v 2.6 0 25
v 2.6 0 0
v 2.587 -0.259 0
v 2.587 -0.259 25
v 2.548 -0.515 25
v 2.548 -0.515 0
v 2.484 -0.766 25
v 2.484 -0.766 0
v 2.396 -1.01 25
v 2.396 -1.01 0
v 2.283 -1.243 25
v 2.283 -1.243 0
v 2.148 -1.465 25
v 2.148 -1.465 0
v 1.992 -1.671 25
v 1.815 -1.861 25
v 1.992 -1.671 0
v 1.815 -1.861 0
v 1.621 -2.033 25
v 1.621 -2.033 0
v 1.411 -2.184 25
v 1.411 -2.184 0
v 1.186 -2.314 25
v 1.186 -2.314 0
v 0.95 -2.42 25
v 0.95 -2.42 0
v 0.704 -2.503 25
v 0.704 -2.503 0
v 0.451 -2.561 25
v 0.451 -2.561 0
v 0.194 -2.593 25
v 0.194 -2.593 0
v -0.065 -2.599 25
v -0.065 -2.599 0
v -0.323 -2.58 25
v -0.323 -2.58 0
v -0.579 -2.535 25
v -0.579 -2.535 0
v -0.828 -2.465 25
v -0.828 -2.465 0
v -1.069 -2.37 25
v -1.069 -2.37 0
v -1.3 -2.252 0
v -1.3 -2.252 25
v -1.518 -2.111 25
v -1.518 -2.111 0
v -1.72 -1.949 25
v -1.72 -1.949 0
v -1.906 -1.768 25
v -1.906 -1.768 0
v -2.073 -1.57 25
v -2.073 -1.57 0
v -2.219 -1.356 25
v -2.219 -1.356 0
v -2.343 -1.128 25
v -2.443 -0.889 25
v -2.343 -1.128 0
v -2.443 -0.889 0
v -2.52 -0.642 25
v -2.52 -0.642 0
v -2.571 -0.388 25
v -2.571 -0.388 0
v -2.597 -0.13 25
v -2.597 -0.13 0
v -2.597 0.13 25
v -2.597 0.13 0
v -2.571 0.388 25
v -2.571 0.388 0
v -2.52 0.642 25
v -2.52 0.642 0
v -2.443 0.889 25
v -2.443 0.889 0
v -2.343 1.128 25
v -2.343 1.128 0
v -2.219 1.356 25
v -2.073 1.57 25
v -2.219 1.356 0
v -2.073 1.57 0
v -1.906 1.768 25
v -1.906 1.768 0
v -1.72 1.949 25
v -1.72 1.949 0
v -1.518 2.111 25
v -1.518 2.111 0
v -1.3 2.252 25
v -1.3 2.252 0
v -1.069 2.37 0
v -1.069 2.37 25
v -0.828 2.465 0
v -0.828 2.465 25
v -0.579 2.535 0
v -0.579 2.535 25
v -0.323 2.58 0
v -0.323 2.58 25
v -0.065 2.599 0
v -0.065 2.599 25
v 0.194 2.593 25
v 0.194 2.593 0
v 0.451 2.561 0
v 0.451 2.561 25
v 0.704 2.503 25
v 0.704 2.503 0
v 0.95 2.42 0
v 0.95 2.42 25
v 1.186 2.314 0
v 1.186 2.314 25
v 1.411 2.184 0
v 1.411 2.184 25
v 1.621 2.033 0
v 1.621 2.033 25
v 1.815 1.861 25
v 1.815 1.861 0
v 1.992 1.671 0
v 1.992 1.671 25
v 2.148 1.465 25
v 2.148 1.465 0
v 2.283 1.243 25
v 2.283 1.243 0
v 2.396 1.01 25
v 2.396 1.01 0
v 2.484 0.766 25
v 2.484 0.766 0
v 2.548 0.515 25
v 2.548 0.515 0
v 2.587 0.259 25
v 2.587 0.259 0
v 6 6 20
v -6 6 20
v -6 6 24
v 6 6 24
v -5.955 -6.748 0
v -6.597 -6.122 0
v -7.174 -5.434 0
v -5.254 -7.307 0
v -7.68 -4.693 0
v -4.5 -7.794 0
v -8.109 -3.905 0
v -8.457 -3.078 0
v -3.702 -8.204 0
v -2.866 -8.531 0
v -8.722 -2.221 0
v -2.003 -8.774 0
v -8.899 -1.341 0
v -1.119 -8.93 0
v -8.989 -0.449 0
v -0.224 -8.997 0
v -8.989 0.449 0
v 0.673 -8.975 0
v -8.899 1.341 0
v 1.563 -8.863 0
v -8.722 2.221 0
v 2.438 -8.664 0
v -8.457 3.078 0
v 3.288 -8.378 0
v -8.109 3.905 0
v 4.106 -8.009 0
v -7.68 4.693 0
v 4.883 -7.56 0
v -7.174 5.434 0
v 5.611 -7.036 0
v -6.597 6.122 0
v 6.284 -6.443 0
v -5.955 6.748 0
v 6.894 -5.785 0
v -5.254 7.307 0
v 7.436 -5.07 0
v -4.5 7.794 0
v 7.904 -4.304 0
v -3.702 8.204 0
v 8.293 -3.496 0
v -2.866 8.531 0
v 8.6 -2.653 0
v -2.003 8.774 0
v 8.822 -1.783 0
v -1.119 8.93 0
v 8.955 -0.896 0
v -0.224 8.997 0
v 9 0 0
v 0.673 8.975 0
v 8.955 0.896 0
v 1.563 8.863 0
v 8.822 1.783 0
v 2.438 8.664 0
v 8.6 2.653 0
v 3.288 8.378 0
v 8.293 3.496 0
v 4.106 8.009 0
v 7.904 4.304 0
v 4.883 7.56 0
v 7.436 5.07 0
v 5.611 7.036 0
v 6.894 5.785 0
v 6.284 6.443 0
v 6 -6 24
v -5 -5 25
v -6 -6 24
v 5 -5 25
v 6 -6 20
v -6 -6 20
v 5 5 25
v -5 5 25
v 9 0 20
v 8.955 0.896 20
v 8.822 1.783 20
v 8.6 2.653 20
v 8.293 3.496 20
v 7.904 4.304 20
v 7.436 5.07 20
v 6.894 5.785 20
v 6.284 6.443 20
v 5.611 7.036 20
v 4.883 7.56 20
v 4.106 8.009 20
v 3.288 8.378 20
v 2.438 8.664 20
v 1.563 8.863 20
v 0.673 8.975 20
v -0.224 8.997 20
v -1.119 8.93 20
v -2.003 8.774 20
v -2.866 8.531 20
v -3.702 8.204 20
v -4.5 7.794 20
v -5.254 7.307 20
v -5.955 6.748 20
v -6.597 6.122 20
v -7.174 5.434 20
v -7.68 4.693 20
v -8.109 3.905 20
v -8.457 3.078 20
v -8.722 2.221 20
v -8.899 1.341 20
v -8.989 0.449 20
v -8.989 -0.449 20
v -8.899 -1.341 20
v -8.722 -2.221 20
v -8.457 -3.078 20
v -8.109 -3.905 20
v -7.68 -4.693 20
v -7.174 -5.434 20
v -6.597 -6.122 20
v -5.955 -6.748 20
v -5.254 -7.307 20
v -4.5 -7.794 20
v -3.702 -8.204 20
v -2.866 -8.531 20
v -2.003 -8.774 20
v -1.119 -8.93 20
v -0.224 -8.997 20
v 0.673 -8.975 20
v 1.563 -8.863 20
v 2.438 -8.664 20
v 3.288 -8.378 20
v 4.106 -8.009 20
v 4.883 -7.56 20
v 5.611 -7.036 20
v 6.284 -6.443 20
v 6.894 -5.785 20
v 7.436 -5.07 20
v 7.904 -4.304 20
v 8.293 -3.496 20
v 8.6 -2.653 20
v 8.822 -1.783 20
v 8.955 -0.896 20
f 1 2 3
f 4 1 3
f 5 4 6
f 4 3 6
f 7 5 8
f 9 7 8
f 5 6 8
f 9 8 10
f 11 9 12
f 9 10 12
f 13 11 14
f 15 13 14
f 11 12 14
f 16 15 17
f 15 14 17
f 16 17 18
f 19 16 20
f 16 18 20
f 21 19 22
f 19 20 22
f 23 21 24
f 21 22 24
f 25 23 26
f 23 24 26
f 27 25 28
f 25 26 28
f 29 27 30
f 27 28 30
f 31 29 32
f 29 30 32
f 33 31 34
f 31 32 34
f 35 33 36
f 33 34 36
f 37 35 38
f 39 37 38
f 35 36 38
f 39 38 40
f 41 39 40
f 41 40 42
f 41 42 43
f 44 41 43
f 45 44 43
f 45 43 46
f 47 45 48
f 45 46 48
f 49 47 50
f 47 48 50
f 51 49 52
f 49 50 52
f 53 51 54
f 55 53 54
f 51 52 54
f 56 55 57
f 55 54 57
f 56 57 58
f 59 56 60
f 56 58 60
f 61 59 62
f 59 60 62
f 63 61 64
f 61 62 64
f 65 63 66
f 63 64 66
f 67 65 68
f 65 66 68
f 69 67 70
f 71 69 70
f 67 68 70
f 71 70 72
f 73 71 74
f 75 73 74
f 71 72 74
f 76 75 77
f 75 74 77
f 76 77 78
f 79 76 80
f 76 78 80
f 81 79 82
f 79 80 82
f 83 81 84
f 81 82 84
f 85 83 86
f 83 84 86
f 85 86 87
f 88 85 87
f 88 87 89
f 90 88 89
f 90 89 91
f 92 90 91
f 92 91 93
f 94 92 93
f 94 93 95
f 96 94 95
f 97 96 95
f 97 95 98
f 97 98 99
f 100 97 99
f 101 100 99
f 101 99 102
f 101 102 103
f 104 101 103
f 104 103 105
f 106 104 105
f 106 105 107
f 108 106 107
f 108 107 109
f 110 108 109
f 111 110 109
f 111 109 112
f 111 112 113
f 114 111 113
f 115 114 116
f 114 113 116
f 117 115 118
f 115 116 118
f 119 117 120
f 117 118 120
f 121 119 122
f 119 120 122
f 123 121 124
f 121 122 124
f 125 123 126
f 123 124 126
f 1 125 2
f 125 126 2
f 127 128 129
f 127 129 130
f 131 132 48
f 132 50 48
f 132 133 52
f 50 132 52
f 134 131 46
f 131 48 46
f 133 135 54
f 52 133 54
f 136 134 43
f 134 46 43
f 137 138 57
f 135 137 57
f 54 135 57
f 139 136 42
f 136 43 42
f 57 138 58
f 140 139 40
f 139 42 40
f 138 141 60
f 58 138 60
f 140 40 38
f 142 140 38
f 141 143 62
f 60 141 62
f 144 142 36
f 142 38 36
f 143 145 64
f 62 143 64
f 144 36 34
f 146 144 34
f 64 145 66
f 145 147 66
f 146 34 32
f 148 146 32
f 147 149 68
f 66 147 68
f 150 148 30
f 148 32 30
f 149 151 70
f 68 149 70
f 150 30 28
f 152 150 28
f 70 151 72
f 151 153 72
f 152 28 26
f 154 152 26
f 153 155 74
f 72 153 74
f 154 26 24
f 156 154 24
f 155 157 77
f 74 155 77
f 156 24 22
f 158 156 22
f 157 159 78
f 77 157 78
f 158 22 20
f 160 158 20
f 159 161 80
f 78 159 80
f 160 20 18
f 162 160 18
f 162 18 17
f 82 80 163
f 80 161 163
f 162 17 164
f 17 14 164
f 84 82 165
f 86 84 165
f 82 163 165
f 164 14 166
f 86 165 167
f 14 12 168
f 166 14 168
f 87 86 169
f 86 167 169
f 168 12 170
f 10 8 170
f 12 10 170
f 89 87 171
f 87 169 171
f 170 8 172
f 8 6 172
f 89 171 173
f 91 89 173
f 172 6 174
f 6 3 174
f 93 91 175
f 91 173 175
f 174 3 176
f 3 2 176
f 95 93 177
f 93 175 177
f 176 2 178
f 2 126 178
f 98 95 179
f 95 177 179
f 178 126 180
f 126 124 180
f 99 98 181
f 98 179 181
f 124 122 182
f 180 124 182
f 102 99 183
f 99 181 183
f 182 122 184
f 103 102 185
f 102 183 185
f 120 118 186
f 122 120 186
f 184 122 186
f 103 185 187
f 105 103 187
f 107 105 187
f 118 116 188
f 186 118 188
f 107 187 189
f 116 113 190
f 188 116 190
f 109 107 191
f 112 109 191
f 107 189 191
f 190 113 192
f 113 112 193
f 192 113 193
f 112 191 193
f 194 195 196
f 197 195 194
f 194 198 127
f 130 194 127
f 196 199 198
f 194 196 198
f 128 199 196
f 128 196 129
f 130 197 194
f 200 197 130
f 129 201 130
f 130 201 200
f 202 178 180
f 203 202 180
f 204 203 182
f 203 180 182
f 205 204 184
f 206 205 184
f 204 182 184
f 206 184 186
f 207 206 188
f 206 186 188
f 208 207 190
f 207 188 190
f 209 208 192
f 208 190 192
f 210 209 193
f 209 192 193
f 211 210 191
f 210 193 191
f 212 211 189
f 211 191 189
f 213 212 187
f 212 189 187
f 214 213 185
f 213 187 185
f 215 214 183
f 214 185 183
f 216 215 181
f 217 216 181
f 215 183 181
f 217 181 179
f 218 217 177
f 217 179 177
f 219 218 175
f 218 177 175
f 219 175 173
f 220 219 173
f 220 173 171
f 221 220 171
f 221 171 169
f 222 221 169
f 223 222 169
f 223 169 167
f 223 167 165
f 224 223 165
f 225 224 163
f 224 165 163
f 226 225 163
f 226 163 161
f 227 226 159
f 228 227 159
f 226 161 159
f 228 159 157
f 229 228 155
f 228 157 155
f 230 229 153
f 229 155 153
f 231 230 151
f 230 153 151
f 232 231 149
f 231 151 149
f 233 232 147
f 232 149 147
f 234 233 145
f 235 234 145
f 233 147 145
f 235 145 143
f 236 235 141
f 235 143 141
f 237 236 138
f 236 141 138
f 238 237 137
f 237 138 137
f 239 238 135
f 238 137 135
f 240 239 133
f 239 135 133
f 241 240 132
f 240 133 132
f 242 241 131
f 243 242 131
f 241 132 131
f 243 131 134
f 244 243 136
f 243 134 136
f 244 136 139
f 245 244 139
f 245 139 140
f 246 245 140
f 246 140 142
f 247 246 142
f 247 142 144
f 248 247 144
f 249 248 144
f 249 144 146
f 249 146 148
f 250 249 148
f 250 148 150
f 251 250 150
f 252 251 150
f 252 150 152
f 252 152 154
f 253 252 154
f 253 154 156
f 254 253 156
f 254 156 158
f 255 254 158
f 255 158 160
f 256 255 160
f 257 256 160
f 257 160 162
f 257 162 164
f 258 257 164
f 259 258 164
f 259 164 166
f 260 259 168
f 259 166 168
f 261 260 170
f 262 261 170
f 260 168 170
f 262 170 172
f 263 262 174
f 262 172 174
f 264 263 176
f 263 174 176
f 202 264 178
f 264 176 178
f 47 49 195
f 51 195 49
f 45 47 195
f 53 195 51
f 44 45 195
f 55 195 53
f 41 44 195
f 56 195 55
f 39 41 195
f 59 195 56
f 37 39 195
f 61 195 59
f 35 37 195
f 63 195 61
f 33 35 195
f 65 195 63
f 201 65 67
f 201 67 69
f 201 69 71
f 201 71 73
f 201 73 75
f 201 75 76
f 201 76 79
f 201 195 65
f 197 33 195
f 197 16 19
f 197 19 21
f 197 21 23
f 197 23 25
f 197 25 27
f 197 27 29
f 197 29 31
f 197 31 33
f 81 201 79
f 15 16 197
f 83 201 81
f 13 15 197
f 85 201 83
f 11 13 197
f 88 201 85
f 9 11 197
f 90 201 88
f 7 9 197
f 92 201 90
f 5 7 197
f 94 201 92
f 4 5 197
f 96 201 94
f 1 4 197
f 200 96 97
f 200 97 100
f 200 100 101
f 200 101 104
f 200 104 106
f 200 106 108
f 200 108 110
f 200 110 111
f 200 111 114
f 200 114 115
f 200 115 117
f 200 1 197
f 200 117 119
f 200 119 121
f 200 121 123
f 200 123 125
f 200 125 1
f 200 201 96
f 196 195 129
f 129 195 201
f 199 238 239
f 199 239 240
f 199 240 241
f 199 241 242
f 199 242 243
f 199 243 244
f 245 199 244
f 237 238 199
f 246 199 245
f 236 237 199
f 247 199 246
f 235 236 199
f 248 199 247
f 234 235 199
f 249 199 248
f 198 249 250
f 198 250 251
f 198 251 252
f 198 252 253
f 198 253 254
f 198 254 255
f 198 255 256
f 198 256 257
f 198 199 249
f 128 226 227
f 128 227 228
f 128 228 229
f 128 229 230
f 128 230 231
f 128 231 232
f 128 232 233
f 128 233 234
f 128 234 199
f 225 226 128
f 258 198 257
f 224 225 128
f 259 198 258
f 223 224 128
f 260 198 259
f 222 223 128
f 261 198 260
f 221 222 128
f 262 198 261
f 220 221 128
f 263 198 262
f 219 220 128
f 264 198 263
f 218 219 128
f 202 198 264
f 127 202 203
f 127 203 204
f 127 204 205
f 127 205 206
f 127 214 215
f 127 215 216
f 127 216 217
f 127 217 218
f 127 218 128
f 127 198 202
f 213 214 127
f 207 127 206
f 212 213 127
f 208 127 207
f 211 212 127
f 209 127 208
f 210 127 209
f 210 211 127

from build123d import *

# Parameters (mm, degrees)
SKETCH_R     = 9
PAD_DEPTH    = 20
SKETCH002_W  = 12
SKETCH002_H  = 12
PAD001_DEPTH = 5
SKETCH003_R  = 2.6
POCKET_DEPTH = 25
CHAMFER_SIZE = 1


with BuildPart() as part:
    # Sketch → Pad (new body)
    with BuildSketch(Plane.XY):
        Circle(SKETCH_R)
    extrude(amount=PAD_DEPTH)

    # Sketch002 (on Face3 of Pad) → Pad001 (join)
    with BuildSketch(Plane.XY.offset(20)):
        Rectangle(SKETCH002_W, SKETCH002_H)
    extrude(amount=PAD001_DEPTH)

    # Sketch003 (on Face2 of Pad001) → Pocket (cut)
    with BuildSketch(Plane(origin=(0, 0, 0), x_dir=(1, 0, 0), z_dir=(0, 0, -1))):
        Circle(SKETCH003_R)
    extrude(amount=-POCKET_DEPTH, mode=Mode.SUBTRACT)

    # Chamfer
    chamfer_edges = [part.edges().sort_by_distance(p)[0] for p in [
        (-6, 0, 25),
        (0, -6, 25),
        (6, 0, 25),
        (0, 6, 25),
    ]]
    chamfer(chamfer_edges, length=CHAMFER_SIZE)


solid = part.part
